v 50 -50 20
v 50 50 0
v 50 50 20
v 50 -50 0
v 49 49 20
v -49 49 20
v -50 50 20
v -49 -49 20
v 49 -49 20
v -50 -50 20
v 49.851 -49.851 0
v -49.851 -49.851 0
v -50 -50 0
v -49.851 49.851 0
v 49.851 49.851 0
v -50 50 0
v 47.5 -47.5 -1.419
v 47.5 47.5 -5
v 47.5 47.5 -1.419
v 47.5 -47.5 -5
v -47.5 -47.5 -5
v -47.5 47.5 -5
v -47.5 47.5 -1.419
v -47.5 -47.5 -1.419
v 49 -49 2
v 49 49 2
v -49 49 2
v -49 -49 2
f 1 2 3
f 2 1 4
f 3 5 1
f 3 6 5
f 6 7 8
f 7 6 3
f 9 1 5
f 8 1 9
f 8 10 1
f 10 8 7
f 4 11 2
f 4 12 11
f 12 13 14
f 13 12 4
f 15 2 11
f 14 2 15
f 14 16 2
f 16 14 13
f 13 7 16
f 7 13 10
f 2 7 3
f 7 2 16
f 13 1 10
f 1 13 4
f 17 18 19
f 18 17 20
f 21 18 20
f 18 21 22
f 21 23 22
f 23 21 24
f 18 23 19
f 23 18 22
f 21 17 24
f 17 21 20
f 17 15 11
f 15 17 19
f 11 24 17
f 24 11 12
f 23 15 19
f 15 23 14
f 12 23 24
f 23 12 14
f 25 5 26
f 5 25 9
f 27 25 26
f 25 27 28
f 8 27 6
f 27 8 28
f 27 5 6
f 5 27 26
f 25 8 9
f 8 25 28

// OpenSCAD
H=20;               // Height of main box
H2=5;               // Height of bottom centering
SIDE=100;           // Side of box
D=2;                // Wall-thickness of box
D2=2.5;             // Setback of centering
HI=18;              // Inner Cut-Out

difference() {
    union() {
        translate([0,0,H/2]) cube([SIDE,SIDE,H], center=true );                                     // Main Box 100x100x40
        translate([0,0,-H2/2]) cube([SIDE-2*D2,SIDE-2*D2,H2],center=true);                          // Bottom
        translate([0,0,-2]) rotate([0,0,45]) cylinder(h=2,d1=1.35*(SIDE-D2),d2=1.41*SIDE,$fn=4);    // Chamfer
    }
    translate([0,0, 2*H-HI]) cube([SIDE-D,SIDE-D,2*H],center=true);                                  // Inner Cut-Out
    
//    translate([0,-100,0]) cube([300,200,300],center=true); // Tester
   
}
